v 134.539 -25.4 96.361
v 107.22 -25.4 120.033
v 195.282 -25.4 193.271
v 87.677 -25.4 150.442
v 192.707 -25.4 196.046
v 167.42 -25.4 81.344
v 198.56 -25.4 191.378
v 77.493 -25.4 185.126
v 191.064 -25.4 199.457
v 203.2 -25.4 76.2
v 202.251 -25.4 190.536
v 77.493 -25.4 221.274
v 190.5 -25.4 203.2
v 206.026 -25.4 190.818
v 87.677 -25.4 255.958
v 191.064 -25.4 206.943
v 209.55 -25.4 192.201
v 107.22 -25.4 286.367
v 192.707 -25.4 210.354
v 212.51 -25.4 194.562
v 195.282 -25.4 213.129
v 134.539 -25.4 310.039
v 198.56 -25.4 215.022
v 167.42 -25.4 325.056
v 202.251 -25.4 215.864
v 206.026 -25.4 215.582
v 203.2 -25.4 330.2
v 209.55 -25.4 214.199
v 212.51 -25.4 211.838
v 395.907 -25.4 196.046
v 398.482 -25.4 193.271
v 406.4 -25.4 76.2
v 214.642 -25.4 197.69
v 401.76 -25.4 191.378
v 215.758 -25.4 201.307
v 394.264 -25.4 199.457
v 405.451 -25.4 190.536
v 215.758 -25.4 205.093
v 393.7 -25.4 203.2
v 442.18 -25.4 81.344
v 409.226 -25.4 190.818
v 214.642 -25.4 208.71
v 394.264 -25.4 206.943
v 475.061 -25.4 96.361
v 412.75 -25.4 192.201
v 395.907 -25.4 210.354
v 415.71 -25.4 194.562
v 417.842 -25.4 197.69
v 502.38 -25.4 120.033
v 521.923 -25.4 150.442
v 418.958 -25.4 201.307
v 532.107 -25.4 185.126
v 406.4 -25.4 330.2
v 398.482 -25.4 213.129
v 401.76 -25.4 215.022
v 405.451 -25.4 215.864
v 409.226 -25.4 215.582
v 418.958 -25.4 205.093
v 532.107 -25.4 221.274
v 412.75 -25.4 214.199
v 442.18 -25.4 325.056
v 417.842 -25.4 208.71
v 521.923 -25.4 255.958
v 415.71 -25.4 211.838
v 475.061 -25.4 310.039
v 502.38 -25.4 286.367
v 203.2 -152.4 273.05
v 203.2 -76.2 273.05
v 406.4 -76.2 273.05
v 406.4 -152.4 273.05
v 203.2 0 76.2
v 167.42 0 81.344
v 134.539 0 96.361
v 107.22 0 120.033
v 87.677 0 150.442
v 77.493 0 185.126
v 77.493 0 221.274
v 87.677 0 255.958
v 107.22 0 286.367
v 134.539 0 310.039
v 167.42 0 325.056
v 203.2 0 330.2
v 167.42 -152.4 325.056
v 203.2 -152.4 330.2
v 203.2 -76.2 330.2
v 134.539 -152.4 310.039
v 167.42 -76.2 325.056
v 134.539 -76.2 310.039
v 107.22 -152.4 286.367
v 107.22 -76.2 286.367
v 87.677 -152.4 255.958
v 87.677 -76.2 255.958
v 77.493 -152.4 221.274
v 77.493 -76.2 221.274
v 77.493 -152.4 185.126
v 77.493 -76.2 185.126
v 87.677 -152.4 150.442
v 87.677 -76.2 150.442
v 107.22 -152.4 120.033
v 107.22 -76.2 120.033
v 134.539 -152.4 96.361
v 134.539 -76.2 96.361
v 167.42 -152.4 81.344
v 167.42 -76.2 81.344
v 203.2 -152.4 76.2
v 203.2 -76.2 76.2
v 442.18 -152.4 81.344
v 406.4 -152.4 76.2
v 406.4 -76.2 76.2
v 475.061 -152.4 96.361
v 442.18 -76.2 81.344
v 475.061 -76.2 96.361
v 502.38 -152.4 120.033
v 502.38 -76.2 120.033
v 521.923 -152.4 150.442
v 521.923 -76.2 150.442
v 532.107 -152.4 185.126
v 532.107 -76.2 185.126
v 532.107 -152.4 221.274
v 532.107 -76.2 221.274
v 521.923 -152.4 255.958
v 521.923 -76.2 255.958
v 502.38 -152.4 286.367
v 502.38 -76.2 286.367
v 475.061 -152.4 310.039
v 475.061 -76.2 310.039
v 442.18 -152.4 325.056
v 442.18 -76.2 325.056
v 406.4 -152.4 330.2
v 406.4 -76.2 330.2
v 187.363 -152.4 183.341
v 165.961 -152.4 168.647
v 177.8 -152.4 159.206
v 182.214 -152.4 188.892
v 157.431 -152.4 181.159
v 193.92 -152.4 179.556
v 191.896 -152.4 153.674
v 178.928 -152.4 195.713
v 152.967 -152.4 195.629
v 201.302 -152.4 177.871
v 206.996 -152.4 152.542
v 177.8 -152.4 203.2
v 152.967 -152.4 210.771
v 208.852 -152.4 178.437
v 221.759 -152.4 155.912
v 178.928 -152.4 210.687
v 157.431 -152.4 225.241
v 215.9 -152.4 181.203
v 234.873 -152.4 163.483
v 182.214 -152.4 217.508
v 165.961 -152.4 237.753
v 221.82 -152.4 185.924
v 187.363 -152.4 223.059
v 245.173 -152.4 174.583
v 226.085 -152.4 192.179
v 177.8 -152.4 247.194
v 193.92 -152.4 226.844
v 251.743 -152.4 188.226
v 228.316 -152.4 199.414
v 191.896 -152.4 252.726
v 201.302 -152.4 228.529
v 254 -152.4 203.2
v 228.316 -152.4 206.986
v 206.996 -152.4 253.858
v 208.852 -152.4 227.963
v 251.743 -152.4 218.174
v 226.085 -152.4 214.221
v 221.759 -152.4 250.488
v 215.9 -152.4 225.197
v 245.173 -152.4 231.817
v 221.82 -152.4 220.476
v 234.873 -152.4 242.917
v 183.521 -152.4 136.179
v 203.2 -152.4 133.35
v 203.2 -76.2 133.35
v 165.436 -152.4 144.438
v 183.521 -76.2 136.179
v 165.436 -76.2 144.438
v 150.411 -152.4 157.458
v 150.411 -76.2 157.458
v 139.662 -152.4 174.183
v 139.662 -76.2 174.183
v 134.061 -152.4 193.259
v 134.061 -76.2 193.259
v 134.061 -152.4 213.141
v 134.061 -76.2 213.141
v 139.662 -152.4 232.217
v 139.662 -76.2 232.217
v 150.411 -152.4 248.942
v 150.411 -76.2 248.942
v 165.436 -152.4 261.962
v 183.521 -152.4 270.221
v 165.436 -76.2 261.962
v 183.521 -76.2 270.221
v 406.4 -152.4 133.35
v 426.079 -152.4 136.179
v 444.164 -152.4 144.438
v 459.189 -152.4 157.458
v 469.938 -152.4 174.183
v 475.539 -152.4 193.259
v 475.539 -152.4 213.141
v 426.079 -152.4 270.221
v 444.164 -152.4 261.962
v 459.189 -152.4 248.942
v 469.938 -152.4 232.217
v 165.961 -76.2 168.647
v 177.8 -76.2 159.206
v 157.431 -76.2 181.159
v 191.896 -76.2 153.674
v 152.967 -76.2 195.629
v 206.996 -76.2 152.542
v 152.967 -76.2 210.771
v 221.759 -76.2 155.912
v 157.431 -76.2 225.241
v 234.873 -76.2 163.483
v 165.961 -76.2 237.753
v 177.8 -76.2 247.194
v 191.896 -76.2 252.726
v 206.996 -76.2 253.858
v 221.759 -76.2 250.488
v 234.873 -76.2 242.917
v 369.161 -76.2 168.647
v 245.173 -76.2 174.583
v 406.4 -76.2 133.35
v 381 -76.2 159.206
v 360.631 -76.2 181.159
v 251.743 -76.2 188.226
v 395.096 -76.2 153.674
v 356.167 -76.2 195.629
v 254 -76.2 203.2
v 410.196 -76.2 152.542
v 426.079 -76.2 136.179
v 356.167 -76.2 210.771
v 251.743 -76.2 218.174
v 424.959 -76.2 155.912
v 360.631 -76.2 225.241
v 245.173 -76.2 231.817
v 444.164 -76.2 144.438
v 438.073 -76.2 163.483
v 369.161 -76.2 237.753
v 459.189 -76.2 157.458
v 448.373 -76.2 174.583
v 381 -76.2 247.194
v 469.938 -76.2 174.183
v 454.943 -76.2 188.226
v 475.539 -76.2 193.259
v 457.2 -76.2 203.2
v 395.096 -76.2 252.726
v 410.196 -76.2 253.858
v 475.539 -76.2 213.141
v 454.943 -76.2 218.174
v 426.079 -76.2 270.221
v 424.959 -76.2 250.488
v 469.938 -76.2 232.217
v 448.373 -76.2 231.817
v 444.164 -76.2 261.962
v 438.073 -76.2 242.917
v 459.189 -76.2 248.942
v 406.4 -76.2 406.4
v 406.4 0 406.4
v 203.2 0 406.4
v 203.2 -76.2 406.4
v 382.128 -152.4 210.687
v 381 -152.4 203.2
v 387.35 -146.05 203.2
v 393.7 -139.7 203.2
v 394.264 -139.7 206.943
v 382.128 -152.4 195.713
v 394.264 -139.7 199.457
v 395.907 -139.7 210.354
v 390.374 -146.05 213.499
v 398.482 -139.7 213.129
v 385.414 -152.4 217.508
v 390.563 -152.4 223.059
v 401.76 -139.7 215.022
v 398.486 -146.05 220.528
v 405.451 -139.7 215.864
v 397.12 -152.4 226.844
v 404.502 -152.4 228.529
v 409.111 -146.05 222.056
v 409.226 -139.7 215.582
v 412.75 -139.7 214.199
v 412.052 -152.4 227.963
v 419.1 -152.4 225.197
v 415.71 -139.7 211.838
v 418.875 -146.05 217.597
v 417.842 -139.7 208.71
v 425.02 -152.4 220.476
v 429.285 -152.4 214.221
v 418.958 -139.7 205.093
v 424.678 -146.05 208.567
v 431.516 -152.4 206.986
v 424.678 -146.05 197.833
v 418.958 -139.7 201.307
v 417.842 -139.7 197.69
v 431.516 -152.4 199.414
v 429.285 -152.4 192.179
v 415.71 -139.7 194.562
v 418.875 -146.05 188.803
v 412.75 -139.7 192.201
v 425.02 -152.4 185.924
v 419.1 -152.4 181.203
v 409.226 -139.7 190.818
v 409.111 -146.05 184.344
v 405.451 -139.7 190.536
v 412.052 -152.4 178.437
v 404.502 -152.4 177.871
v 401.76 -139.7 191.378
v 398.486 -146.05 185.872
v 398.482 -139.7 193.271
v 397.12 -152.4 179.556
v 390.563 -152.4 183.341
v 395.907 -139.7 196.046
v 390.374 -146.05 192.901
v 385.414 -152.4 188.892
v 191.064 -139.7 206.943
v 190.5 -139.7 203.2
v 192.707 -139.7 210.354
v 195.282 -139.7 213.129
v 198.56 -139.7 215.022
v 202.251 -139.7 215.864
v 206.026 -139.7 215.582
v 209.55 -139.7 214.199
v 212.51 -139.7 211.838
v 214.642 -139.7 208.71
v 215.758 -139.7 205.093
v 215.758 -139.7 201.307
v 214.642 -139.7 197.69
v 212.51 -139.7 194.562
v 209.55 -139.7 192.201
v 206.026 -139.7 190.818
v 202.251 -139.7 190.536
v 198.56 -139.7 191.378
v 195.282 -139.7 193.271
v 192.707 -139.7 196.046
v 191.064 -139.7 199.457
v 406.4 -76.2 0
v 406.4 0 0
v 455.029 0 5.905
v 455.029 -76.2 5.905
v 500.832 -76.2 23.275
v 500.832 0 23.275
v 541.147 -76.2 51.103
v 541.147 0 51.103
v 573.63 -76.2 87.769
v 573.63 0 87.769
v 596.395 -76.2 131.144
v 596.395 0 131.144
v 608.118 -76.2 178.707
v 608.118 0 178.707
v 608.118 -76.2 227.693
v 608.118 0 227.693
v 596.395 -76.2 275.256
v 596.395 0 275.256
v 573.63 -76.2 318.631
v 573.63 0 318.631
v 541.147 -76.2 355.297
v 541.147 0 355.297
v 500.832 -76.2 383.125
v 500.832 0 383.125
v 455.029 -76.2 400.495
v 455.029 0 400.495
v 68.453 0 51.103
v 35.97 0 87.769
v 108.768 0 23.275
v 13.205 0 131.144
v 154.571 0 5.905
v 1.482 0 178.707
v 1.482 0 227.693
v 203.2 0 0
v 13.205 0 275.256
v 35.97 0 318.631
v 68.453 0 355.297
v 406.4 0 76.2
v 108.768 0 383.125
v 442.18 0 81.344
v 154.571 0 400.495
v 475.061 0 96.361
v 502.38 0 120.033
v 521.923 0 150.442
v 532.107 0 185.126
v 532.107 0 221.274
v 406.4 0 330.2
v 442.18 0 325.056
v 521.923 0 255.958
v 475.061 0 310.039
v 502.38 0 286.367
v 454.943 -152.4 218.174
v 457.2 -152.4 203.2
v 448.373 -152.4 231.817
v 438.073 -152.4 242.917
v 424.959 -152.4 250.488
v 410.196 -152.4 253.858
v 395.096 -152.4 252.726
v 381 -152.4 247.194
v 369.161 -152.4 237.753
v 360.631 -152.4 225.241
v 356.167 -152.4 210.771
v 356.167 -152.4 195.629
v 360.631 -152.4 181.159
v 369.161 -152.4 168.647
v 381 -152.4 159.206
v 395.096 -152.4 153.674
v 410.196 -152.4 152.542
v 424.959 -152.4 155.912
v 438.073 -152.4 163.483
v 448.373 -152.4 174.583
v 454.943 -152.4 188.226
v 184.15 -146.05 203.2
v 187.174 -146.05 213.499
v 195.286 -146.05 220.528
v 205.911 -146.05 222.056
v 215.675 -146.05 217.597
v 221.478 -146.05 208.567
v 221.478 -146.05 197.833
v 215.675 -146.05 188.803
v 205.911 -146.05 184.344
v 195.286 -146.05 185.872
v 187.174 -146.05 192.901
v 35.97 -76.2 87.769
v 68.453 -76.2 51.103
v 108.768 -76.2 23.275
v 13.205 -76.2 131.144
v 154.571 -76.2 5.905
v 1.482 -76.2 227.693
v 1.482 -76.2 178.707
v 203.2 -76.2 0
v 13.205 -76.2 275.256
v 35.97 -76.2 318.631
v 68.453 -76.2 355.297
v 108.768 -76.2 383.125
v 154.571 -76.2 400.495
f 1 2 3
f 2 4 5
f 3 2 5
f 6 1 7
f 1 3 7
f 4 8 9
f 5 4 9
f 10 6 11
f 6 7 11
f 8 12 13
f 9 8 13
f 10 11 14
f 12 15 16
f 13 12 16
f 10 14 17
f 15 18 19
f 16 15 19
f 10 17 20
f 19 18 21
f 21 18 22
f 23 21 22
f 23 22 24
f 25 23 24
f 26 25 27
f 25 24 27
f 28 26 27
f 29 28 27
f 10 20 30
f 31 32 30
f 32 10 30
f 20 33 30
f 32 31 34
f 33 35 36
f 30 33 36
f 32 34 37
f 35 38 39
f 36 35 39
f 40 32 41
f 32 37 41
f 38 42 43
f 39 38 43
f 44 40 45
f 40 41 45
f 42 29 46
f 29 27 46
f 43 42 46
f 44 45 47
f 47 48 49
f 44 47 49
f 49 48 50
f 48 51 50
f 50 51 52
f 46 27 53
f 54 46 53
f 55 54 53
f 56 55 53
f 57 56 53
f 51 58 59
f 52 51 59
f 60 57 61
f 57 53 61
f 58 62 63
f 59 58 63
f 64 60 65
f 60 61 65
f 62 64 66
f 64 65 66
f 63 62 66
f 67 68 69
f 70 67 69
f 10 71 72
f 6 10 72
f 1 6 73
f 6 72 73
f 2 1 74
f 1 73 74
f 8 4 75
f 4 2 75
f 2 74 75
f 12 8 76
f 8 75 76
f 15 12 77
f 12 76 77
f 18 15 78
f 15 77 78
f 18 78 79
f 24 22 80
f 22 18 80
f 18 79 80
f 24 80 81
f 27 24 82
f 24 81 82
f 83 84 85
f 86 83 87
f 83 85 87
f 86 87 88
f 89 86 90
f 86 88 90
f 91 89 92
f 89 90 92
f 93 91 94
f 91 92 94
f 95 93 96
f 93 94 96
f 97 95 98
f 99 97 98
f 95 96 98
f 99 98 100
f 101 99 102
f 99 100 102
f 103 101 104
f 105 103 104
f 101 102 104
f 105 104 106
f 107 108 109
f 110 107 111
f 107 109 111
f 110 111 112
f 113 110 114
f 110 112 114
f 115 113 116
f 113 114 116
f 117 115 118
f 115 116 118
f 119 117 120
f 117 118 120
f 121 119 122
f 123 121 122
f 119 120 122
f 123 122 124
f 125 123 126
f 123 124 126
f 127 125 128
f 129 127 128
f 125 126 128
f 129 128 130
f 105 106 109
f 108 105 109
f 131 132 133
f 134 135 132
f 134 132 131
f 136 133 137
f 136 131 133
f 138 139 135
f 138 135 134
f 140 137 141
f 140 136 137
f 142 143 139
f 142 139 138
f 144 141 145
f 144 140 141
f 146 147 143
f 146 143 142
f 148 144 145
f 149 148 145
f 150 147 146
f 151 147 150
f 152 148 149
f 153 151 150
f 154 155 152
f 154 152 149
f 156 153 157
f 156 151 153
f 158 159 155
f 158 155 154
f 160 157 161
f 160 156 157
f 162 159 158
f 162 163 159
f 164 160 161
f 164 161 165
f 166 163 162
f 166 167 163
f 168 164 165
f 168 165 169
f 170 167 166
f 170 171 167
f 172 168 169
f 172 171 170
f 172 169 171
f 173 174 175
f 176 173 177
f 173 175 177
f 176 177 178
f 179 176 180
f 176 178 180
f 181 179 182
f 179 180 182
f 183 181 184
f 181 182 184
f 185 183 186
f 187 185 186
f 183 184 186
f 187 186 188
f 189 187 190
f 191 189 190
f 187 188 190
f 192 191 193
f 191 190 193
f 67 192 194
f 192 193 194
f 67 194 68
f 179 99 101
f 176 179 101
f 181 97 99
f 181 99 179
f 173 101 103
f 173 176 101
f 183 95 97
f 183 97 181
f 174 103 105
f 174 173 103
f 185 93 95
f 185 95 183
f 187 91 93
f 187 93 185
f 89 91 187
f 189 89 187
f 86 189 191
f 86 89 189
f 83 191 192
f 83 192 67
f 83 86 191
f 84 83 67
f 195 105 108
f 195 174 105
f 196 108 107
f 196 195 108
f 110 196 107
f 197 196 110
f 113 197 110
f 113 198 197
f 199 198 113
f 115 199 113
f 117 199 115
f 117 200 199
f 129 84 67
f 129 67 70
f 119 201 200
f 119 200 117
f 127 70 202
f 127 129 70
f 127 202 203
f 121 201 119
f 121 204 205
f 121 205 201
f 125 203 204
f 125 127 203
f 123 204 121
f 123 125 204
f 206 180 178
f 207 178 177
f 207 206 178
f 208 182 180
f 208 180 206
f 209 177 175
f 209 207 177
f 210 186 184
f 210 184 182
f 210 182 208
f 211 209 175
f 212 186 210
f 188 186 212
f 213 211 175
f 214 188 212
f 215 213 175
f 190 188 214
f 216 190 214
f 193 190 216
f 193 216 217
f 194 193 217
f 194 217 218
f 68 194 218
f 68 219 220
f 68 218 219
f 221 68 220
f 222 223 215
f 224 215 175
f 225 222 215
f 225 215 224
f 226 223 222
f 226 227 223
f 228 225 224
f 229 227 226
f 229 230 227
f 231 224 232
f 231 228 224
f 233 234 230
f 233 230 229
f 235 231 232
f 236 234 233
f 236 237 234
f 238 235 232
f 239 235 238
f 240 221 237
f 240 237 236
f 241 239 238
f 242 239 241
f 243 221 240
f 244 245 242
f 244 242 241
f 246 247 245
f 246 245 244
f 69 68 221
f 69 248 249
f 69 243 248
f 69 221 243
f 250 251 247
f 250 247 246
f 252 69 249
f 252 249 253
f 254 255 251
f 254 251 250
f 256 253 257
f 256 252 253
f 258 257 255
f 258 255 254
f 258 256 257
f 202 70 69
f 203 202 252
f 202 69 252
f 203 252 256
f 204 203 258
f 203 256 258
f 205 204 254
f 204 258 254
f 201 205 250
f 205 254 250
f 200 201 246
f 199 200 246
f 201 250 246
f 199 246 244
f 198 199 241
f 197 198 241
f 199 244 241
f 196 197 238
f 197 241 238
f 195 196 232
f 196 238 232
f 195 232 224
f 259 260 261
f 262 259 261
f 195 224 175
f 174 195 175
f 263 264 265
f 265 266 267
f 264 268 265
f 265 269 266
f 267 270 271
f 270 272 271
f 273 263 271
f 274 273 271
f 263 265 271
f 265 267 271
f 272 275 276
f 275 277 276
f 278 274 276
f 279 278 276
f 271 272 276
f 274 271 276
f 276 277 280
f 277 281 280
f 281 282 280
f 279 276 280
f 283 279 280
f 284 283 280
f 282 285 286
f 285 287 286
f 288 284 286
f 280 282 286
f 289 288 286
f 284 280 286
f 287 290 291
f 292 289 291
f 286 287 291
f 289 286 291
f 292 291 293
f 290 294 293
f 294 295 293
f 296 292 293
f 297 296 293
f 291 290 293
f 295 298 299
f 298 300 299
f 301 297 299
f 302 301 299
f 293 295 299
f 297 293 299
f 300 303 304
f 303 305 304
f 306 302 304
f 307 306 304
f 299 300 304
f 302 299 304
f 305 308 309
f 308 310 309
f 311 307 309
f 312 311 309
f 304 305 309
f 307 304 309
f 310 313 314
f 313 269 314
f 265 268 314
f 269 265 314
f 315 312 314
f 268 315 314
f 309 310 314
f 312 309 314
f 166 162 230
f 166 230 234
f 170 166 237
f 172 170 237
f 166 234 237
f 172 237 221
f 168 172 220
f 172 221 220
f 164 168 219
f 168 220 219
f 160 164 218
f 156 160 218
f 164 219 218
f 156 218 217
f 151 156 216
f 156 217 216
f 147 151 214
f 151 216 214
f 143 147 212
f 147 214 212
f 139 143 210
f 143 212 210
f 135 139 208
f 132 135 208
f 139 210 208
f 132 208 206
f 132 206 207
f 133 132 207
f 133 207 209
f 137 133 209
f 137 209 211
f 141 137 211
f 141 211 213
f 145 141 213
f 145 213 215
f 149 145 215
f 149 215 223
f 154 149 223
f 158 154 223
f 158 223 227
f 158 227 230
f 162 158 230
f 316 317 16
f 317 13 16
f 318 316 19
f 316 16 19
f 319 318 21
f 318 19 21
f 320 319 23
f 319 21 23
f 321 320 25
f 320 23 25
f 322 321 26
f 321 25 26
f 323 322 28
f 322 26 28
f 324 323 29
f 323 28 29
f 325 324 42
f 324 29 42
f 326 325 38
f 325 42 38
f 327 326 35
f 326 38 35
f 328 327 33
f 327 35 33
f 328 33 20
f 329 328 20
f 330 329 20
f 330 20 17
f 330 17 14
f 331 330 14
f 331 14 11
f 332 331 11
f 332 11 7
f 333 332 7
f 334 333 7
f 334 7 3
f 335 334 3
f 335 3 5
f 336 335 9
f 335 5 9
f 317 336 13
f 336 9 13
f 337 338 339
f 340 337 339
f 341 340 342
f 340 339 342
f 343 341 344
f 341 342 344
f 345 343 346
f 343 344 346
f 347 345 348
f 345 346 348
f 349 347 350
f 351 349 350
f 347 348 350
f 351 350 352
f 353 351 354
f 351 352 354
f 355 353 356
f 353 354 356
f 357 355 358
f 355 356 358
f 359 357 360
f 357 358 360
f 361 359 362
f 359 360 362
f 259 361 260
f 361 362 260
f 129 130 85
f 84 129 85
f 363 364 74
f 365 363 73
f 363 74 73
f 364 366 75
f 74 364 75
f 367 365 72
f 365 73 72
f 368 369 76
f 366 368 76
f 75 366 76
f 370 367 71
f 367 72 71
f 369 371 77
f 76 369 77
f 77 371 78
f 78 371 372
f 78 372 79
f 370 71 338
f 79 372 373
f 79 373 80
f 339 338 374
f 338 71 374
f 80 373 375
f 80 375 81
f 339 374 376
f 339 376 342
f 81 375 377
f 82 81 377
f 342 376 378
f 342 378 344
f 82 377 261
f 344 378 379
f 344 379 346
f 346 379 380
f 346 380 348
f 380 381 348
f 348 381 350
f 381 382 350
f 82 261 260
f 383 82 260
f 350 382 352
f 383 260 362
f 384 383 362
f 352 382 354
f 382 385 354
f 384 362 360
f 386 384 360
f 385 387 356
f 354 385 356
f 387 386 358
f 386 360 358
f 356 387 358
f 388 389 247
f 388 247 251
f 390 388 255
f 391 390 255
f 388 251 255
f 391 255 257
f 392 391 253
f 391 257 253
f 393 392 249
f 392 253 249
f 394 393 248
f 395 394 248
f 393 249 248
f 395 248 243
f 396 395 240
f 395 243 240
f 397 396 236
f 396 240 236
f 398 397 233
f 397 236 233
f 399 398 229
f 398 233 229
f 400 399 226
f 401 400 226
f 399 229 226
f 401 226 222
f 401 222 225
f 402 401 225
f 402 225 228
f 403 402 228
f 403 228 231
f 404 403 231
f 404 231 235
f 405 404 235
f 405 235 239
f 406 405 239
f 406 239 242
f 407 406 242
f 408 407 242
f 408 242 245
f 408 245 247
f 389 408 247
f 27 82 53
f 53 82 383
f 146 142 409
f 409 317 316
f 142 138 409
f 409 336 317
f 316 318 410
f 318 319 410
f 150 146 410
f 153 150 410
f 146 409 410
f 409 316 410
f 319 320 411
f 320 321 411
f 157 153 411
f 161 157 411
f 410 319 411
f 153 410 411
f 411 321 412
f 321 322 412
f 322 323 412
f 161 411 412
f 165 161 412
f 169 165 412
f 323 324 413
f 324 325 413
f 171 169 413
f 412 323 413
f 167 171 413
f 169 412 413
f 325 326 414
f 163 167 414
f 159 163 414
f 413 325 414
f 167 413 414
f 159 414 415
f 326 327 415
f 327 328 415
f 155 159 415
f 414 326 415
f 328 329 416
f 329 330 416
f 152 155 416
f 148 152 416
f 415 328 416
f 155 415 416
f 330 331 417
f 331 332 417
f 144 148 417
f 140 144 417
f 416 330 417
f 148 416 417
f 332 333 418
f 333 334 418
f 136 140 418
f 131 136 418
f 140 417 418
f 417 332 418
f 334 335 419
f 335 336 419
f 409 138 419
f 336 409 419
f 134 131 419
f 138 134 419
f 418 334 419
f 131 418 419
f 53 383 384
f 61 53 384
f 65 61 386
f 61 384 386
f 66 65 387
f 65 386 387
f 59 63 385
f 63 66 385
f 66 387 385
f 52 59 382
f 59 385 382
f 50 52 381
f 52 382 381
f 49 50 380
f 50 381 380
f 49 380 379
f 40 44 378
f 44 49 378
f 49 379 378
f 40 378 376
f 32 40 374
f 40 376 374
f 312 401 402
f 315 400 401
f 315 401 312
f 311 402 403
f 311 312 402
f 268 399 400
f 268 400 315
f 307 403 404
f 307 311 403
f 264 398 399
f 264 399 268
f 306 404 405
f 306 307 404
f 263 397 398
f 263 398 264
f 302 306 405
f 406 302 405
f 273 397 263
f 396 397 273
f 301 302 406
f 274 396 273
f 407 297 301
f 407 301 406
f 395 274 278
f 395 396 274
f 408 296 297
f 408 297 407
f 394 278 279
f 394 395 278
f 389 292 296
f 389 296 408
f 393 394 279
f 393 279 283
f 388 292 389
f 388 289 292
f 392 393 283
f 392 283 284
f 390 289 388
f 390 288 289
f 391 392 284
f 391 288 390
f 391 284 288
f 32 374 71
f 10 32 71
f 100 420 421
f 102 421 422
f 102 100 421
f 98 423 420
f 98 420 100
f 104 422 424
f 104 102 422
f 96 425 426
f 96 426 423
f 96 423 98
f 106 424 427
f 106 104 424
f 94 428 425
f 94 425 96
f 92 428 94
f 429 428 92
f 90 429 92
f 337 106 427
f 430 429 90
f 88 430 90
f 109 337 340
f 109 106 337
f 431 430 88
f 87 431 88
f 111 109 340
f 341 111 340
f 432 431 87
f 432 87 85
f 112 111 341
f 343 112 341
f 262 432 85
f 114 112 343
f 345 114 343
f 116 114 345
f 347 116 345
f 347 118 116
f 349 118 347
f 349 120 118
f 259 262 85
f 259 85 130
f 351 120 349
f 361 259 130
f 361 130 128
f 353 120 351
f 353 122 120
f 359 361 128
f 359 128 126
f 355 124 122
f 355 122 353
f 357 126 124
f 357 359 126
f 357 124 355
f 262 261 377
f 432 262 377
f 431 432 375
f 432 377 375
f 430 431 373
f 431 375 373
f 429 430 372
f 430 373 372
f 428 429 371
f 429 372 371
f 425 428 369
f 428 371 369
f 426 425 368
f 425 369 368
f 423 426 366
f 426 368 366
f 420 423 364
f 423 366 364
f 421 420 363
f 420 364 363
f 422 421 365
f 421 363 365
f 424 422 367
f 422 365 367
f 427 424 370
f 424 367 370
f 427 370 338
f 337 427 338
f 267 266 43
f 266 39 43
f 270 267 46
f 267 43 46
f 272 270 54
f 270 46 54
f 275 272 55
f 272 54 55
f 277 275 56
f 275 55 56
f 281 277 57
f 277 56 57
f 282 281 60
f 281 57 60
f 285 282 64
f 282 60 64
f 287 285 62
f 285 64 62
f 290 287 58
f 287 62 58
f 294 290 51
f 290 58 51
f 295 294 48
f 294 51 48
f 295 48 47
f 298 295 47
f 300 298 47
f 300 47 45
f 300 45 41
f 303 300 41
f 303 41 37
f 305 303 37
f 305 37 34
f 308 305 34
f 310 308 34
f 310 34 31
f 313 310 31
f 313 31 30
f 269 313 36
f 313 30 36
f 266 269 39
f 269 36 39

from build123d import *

# Parameters (mm, degrees)
F1_DEPTH       = 76.2
F2_START       = 25.4
F2_DEPTH       = 127
F3_START       = 25.4
F0_R           = 50.8
F3_DEPTH       = 50.8
F4_START       = 25.4
F0_R_2         = 25.4
F0_R_3         = 12.7
F4_DEPTH       = 127
F6_D           = 25.4
F6_CSINK_D     = 50.8
F6_CSINK_ANGLE = 90


with BuildPart() as f1:
    # F0 (on Front) → F1 (new body)
    with BuildSketch(Plane.XZ):
        with BuildLine():
            ThreePointArc((0, 203.2), (59.5159020629, 59.5159020629), (203.2, 0))
            Line((203.2, 0), (406.4, 0))
            ThreePointArc((406.4, 0), (550.0840979371, 59.5159020629), (609.6, 203.2))
            ThreePointArc((609.6, 203.2), (550.0840979371, 346.8840979371), (406.4, 406.4))
            Line((406.4, 406.4), (203.2, 406.4))
            ThreePointArc((203.2, 406.4), (59.5159020629, 346.8840979371), (0, 203.2))
        make_face()
        with BuildLine():
            Line((203.2, 330.2), (406.4, 330.2))
            ThreePointArc((406.4, 330.2), (533.4, 203.2), (406.4, 76.2))
            Line((406.4, 76.2), (203.2, 76.2))
            ThreePointArc((203.2, 76.2), (76.2, 203.2), (203.2, 330.2))
        make_face(mode=Mode.SUBTRACT)
    extrude(amount=F1_DEPTH)

    # F0 (on Front) → F2 (join)
    with BuildSketch(Plane.XZ.offset(F2_START)):
        with BuildLine():
            ThreePointArc((406.4, 76.2), (533.4, 203.2), (406.4, 330.2))
            Line((406.4, 330.2), (203.2, 330.2))
            ThreePointArc((203.2, 330.2), (76.2, 203.2), (203.2, 76.2))
            Line((203.2, 76.2), (406.4, 76.2))
        make_face()
        with BuildLine():
            Line((203.2, 304.8), (406.4, 304.8))
            ThreePointArc((406.4, 304.8), (508, 203.2), (406.4, 101.6))
            Line((406.4, 101.6), (203.2, 101.6))
            ThreePointArc((203.2, 101.6), (101.6, 203.2), (203.2, 304.8))
        make_face(mode=Mode.SUBTRACT)
        with BuildLine():
            ThreePointArc((406.4, 101.6), (508, 203.2), (406.4, 304.8))
            Line((406.4, 304.8), (203.2, 304.8))
            ThreePointArc((203.2, 304.8), (101.6, 203.2), (203.2, 101.6))
            Line((203.2, 101.6), (406.4, 101.6))
        make_face()
        with BuildLine():
            Line((406.4, 133.35), (203.2, 133.35))
            ThreePointArc((203.2, 133.35), (133.35, 203.2), (203.2, 273.05))
            Line((203.2, 273.05), (406.4, 273.05))
            ThreePointArc((406.4, 273.05), (476.25, 203.2), (406.4, 133.35))
        make_face(mode=Mode.SUBTRACT)
    extrude(amount=F2_DEPTH)

    # F0 (on Front) → F3 (join)
    with BuildSketch(Plane.XZ.offset(F3_START)):
        with BuildLine():
            ThreePointArc((203.2, 273.05), (133.35, 203.2), (203.2, 133.35))
            Line((203.2, 133.35), (406.4, 133.35))
            ThreePointArc((406.4, 133.35), (476.25, 203.2), (406.4, 273.05))
            Line((406.4, 273.05), (203.2, 273.05))
        make_face()
        with Locations((203.2, 203.2)):
            Circle(F0_R, mode=Mode.SUBTRACT)
        with Locations((406.4, 203.2)):
            Circle(F0_R, mode=Mode.SUBTRACT)
    extrude(amount=F3_DEPTH)

    # F0 (on Front) → F4 (join)
    with BuildSketch(Plane.XZ.offset(F4_START)):
        with Locations((406.4, 203.2)):
            Circle(F0_R)
        with Locations((406.4, 203.2)):
            Circle(F0_R_2, mode=Mode.SUBTRACT)
        with Locations((203.2, 203.2)):
            Circle(F0_R)
        with Locations((203.2, 203.2)):
            Circle(F0_R_2, mode=Mode.SUBTRACT)
        with Locations((203.2, 203.2)):
            Circle(F0_R_2)
        with Locations((203.2, 203.2)):
            Circle(F0_R_3, mode=Mode.SUBTRACT)
        with Locations((406.4, 203.2)):
            Circle(F0_R_2)
        with Locations((406.4, 203.2)):
            Circle(F0_R_3, mode=Mode.SUBTRACT)
        with Locations((203.2, 203.2)):
            Circle(F0_R_3)
        with Locations((406.4, 203.2)):
            Circle(F0_R_3)
    extrude(amount=F4_DEPTH)

    # F6 (through all)
    with Locations(Plane.XZ.offset(152.4)):
        with Locations((203.2, 203.2), (406.4, 203.2)):
            CounterSinkHole(F6_D / 2, F6_CSINK_D / 2, counter_sink_angle=F6_CSINK_ANGLE)


solid = f1.part
